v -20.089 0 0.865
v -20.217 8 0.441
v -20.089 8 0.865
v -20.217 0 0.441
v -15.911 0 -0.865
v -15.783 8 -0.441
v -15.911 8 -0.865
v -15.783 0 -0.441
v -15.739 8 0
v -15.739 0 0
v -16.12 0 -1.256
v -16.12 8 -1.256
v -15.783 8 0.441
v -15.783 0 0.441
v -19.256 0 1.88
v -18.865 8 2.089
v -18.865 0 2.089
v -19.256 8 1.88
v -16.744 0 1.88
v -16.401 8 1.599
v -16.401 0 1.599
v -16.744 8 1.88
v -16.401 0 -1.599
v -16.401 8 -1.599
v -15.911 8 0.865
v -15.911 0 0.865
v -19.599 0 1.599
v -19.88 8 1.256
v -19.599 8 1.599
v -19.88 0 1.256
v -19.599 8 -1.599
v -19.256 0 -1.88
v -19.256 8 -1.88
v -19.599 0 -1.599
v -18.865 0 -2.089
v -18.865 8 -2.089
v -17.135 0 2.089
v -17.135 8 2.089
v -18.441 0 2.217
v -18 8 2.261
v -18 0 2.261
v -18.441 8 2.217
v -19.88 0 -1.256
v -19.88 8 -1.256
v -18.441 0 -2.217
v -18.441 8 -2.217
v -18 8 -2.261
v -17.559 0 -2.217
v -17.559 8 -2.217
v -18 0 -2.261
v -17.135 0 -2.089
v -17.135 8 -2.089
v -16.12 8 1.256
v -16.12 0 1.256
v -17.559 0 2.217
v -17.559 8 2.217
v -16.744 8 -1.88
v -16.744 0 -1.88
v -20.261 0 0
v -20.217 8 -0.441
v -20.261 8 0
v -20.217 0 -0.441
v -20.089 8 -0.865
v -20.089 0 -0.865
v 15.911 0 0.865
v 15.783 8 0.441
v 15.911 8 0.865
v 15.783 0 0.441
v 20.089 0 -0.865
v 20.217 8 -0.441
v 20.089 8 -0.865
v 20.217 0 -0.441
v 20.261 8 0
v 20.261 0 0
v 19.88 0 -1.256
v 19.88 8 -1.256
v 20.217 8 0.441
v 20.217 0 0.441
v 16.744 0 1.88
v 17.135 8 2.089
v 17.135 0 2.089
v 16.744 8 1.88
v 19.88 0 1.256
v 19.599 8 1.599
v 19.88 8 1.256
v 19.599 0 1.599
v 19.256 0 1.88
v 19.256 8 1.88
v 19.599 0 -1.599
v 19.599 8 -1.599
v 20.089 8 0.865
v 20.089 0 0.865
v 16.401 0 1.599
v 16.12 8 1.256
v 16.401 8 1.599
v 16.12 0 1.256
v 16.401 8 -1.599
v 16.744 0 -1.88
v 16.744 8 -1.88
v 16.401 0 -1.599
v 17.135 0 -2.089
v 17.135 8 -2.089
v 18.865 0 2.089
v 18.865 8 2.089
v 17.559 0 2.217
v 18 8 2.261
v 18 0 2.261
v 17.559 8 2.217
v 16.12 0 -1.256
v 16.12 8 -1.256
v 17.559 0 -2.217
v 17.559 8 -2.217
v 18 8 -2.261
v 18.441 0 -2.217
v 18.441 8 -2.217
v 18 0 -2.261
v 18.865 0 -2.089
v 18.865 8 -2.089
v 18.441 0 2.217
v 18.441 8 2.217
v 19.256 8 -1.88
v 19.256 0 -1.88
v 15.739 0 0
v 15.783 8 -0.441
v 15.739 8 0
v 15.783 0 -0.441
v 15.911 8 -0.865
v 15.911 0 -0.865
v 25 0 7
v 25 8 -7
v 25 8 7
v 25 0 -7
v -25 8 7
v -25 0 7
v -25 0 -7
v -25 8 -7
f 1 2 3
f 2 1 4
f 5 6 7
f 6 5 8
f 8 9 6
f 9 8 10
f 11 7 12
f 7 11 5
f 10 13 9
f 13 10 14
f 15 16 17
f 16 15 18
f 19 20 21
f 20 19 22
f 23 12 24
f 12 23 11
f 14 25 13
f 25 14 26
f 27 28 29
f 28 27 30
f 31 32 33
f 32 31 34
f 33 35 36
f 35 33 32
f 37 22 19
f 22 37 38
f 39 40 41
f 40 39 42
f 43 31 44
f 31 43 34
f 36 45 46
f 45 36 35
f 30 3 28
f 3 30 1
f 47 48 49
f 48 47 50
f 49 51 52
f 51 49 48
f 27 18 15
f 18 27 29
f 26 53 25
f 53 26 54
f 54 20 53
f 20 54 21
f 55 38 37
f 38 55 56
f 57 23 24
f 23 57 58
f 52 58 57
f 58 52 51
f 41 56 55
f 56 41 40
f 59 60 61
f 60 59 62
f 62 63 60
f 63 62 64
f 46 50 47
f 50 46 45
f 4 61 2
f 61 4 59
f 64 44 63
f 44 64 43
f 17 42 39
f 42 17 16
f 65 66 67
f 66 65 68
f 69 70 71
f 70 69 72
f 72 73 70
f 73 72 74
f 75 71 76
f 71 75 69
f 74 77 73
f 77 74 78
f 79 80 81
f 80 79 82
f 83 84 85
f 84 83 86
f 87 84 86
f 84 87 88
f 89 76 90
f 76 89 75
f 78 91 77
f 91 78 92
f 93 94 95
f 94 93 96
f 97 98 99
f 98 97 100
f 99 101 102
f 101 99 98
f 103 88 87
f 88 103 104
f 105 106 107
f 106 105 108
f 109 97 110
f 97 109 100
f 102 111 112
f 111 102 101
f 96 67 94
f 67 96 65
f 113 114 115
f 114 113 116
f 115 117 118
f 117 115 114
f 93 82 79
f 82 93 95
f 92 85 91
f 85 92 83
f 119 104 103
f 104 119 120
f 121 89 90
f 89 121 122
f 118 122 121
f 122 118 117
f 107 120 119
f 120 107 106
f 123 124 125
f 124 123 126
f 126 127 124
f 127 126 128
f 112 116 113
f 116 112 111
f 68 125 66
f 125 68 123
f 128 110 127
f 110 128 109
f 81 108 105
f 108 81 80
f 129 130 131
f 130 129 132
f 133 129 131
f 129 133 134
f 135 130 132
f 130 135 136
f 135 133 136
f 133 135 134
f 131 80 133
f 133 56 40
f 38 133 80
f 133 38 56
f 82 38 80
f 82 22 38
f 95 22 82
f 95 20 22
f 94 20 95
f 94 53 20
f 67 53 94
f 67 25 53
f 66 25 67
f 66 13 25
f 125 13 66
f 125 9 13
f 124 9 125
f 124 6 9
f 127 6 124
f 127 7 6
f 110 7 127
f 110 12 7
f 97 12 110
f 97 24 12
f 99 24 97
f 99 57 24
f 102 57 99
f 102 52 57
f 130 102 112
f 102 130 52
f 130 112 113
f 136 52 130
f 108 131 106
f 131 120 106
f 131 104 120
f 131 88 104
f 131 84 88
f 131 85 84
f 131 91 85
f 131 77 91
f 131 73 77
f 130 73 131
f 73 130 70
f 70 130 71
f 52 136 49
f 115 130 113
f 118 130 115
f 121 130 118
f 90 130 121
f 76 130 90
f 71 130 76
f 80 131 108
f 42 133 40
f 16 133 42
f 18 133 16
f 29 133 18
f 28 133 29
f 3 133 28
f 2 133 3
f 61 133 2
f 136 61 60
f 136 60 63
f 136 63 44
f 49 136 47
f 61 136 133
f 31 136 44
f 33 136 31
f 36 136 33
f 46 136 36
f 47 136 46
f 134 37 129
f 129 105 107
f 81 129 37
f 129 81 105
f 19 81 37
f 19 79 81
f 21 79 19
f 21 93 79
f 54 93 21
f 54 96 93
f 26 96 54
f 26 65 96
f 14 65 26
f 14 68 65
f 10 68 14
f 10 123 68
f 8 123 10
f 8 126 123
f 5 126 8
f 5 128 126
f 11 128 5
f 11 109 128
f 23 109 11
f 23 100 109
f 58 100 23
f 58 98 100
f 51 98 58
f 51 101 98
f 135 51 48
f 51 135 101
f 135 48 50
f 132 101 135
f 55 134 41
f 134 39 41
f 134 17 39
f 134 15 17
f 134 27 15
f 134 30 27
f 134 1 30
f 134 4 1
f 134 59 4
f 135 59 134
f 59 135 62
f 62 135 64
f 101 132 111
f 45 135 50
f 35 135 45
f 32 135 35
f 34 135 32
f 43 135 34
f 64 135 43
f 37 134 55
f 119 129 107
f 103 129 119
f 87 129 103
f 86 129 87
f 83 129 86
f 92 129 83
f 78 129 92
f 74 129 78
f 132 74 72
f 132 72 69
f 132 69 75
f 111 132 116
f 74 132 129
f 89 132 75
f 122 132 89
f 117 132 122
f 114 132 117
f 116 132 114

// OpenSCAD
// Sandwich the existing metal TD04A bracket, not the sensor body.
width=50; height=14; thick=8; bolt_pitch=36; bolt_d=4.5;
$fn=48;
assert(bolt_pitch/2-bolt_d/2>12+2);
difference(){
 translate([-width/2,0,-height/2])cube([width,thick,height]);
 for(x=[-bolt_pitch/2,bolt_pitch/2])translate([x,-.02,0])rotate([-90,0,0])cylinder(d=bolt_d/cos(180/32),h=thick+.04,$fn=32);
}
